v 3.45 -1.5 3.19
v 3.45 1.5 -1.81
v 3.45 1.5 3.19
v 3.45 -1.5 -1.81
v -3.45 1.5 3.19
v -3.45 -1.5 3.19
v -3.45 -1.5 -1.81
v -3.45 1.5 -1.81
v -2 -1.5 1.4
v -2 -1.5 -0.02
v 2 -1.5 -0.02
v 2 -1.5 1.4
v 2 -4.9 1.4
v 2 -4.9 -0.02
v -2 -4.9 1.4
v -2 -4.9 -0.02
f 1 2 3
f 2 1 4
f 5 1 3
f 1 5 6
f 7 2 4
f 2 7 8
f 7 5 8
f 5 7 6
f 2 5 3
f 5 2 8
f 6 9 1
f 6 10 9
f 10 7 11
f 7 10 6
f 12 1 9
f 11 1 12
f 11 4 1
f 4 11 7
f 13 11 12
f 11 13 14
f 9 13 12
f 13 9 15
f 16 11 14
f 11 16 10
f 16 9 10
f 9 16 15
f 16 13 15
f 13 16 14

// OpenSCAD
module switch_cutout()
{
	translate ([ 0, 0, .69 ])
		union ()
		{
			cube(size=[6.9,3,5], center=true);
			translate ([0,-2.4,0])
				cube(size=[4,5,1.42], center=true);
		}
}

switch_cutout();
